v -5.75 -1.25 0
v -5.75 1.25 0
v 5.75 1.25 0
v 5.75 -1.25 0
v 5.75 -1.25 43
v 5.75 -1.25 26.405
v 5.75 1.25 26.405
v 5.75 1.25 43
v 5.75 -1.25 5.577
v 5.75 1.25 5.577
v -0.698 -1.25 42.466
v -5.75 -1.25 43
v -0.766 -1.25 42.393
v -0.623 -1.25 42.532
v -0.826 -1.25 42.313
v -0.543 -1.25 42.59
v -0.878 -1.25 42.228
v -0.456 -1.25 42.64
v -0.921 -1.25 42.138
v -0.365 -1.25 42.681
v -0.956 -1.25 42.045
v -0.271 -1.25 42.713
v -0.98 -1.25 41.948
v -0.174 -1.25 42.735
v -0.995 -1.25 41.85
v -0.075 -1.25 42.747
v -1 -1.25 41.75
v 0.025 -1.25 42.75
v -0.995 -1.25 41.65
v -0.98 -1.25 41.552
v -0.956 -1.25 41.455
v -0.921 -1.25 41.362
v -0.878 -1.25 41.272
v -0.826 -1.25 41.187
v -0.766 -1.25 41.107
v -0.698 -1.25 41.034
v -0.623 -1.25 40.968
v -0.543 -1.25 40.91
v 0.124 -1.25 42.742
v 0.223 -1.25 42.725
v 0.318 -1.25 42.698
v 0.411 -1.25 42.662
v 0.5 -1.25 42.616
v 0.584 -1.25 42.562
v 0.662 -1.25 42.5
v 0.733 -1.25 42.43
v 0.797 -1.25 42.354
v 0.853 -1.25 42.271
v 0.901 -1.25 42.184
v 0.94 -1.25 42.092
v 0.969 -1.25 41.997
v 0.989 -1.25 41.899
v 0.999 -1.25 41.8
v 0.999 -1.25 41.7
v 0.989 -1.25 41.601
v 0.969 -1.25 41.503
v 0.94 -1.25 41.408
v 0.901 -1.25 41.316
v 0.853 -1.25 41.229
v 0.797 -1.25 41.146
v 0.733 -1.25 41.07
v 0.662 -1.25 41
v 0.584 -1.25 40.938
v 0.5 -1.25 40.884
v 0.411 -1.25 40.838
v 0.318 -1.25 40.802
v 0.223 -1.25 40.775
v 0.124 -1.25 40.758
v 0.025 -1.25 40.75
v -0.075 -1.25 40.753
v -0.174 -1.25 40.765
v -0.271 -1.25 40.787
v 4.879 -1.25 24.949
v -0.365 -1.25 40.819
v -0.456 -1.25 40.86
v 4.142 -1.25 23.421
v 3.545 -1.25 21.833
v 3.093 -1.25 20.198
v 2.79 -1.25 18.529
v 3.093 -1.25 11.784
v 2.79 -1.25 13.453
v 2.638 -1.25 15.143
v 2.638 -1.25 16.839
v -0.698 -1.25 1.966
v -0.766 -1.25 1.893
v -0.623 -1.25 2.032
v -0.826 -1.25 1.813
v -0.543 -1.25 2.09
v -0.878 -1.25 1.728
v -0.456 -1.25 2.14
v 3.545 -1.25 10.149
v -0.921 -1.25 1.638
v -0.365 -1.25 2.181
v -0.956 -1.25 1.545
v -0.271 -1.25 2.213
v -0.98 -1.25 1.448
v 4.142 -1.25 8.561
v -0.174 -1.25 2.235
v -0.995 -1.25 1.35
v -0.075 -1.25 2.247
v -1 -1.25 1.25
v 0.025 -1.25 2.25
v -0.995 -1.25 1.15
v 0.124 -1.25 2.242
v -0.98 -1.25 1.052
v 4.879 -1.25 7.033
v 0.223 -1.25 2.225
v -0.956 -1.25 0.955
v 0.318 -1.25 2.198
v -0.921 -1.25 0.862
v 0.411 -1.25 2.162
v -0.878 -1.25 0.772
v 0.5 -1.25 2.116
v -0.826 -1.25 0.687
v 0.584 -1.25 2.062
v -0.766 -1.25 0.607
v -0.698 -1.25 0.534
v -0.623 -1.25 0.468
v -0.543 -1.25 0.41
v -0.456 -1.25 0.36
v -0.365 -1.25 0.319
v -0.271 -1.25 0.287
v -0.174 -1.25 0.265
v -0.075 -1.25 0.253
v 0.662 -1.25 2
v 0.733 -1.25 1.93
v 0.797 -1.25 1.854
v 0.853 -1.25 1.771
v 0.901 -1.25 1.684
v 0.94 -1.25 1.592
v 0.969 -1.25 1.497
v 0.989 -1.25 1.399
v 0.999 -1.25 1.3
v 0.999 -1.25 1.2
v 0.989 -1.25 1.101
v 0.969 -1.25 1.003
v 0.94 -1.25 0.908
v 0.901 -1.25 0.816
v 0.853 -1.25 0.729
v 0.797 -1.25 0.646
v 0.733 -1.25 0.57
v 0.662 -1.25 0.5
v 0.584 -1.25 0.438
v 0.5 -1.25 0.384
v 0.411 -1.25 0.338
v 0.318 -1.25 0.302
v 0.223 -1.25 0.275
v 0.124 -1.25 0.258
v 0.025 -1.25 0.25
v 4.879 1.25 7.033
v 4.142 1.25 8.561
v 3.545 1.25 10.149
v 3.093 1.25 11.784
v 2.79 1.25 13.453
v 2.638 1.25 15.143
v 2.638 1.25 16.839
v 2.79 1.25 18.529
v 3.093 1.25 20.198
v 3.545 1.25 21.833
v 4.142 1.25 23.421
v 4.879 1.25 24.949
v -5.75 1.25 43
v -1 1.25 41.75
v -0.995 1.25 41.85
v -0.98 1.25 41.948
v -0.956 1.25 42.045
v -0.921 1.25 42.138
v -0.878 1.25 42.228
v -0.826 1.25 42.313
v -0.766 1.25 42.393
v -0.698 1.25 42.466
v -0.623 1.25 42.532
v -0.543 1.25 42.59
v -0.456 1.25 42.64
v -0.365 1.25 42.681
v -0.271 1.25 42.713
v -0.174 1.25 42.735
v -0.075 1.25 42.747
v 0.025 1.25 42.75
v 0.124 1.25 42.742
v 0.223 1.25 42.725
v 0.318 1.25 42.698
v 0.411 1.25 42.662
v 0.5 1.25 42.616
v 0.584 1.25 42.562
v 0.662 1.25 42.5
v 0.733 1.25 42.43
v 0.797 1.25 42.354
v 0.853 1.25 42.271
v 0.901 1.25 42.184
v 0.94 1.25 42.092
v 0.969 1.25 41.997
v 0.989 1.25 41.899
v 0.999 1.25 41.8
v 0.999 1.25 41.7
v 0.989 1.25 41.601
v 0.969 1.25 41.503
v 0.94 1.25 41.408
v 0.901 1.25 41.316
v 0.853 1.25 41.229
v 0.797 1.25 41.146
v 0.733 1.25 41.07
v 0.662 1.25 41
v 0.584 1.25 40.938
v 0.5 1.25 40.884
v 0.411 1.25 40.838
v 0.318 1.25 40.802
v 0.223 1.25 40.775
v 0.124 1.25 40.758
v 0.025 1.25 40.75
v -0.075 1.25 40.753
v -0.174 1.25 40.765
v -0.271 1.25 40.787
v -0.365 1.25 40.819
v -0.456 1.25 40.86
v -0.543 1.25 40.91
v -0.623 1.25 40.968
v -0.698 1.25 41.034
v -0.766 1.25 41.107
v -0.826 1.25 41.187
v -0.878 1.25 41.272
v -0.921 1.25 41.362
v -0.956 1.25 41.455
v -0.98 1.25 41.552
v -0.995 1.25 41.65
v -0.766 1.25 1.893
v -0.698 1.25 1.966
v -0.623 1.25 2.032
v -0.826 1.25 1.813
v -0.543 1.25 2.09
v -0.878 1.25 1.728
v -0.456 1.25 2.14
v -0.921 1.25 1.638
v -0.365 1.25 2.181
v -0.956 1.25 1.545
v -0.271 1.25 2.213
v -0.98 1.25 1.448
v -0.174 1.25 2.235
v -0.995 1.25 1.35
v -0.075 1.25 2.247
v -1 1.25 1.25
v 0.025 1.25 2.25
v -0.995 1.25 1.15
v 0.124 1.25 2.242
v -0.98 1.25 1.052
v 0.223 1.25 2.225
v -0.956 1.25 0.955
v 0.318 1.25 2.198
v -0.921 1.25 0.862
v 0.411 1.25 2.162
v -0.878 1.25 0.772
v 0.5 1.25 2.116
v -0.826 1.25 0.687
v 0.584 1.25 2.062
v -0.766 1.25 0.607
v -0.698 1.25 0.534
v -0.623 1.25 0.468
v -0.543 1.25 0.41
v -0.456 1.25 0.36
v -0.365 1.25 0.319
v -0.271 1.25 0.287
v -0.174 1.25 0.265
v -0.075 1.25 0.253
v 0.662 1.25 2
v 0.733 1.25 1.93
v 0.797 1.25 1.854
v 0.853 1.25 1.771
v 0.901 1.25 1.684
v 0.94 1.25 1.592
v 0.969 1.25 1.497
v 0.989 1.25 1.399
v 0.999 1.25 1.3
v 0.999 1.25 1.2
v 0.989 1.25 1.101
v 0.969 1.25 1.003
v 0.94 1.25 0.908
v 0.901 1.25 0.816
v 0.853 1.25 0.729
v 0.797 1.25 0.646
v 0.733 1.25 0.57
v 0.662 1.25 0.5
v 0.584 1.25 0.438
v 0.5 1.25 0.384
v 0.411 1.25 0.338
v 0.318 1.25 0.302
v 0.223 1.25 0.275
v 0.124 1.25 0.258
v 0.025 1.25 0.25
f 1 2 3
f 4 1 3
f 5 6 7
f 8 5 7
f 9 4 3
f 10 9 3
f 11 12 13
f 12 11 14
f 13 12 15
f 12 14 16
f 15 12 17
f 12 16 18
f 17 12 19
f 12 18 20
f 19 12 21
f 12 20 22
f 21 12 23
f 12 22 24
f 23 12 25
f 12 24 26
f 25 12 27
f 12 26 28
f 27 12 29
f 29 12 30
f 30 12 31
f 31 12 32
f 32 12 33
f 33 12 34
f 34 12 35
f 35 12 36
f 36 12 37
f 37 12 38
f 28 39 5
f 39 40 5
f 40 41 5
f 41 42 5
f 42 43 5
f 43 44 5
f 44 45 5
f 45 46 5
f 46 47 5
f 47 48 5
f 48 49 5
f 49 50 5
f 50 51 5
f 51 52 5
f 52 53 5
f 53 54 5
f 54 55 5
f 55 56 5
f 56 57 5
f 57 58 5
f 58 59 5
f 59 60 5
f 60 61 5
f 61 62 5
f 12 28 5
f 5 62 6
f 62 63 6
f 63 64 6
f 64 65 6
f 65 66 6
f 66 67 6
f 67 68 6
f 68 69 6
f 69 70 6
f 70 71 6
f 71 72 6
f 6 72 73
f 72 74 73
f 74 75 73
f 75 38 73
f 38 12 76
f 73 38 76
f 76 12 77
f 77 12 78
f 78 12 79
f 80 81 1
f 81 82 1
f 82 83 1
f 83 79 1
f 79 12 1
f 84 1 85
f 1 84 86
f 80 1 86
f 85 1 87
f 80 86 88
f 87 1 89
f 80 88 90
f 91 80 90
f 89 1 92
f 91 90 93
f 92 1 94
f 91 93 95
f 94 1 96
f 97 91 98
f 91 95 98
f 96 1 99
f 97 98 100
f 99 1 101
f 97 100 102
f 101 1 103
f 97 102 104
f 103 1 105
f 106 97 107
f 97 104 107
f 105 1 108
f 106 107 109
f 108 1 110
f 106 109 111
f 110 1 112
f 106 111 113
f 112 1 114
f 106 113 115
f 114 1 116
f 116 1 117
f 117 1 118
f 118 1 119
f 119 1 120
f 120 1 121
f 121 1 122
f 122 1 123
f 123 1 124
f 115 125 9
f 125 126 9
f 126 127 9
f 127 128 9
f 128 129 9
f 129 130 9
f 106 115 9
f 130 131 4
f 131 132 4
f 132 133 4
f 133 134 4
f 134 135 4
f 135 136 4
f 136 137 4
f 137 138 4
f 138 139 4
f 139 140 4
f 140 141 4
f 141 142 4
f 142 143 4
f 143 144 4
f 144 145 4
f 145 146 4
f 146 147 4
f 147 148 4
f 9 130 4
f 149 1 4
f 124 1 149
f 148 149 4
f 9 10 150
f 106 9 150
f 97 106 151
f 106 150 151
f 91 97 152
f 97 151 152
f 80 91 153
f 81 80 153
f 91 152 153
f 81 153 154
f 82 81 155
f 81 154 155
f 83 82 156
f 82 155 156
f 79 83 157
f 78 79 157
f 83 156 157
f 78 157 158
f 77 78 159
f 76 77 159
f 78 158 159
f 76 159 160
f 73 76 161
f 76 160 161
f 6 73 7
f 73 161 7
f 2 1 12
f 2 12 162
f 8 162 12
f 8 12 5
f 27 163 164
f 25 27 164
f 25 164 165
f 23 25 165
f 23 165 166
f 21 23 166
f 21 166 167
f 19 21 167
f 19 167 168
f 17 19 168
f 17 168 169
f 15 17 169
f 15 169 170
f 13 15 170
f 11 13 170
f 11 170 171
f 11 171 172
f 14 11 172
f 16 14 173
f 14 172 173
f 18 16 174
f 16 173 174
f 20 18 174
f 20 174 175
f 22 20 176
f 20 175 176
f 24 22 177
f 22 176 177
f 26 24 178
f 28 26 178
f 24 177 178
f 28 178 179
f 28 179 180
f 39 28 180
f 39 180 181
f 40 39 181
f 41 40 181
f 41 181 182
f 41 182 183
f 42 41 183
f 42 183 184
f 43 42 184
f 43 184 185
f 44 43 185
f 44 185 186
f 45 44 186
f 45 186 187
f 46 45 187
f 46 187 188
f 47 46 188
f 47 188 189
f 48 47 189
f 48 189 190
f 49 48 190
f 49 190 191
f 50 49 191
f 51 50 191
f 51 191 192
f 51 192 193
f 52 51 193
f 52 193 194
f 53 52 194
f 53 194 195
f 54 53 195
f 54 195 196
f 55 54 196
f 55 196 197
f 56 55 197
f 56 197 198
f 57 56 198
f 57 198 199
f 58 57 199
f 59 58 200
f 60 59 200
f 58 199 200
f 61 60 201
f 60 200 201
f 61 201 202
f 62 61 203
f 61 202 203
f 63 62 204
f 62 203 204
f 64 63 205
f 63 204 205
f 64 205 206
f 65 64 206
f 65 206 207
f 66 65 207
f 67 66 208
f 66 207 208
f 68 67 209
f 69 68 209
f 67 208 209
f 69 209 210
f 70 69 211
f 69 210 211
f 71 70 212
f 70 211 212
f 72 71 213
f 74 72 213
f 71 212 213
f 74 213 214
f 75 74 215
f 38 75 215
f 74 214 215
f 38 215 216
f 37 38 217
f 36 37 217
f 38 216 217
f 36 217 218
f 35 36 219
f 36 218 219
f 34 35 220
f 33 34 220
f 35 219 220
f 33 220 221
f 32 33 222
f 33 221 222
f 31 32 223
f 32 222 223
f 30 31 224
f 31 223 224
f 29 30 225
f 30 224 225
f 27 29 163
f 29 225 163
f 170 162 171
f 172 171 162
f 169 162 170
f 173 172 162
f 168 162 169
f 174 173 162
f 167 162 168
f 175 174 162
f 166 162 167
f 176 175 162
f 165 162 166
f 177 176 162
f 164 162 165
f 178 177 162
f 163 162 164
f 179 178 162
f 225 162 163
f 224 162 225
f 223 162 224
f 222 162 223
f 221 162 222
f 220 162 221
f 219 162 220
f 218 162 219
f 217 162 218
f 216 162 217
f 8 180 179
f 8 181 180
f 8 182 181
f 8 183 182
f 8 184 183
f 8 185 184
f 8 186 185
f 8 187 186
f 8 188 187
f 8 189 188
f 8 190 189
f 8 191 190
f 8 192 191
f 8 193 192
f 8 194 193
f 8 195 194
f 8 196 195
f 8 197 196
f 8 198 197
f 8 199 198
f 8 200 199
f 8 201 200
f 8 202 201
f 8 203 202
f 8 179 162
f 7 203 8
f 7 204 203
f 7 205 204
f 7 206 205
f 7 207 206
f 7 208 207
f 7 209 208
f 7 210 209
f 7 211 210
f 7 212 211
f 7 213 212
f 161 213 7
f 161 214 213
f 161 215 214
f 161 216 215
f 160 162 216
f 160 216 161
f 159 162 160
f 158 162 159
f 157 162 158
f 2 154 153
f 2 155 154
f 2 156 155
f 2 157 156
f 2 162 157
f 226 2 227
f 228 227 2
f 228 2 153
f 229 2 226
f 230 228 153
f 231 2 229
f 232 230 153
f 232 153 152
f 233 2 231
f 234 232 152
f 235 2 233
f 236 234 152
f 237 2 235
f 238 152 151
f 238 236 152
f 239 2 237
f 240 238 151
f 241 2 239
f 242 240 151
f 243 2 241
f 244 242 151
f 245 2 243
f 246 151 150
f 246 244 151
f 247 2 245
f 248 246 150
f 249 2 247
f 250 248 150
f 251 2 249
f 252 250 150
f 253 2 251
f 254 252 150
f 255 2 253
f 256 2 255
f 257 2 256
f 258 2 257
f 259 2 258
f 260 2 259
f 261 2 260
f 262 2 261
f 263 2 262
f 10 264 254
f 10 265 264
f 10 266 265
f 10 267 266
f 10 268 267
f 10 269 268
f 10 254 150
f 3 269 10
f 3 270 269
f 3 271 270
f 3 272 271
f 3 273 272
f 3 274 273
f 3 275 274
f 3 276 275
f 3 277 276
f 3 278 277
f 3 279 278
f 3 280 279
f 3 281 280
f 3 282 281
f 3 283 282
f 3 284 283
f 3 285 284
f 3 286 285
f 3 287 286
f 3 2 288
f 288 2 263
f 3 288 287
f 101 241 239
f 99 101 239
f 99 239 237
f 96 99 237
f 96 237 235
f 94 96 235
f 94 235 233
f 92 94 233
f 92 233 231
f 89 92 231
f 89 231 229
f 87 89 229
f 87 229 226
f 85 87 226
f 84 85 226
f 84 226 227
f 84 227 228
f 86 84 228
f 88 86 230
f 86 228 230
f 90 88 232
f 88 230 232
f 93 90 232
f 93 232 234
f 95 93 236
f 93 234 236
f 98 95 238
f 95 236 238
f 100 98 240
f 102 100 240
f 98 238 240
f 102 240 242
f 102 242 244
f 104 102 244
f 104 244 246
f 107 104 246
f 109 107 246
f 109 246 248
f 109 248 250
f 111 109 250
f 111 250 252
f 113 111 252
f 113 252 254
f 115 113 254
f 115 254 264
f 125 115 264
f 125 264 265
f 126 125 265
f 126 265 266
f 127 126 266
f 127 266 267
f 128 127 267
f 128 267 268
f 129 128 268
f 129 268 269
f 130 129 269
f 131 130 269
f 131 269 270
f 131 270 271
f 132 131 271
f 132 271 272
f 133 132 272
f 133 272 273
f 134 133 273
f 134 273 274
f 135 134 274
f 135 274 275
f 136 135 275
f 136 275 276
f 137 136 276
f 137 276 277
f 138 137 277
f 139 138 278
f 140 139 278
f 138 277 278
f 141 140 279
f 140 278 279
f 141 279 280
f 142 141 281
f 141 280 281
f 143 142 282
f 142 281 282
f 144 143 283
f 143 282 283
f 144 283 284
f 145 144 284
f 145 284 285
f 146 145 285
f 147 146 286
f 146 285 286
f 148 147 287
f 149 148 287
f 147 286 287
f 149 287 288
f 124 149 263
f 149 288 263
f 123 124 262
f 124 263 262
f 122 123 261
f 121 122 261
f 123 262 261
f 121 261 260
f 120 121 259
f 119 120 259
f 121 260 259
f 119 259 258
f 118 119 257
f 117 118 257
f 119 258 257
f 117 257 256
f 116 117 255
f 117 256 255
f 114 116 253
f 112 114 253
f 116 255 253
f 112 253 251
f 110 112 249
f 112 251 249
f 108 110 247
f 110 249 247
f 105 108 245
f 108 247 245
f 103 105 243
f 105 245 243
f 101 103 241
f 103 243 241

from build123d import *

# Parameters (mm, degrees)
F0_W     = 11.5
F0_H     = 2.5
F1_DEPTH = 43
F2_R     = 1
F3_DEPTH = 25
F5_DEPTH = 25


with BuildPart() as f1:
    # F0 (on Top) → F1 (new body)
    with BuildSketch(Plane.XY):
        Rectangle(F0_W, F0_H)
    extrude(amount=F1_DEPTH)

    # F2 (on face) → F3 (cut)
    with BuildSketch(Plane(origin=(0, 1.25, 0), x_dir=(-1, 0, 0), z_dir=(0, 1, 0))):
        with Locations((0, 1.25)):
            Circle(F2_R)
        with Locations((0, 41.75)):
            Circle(F2_R)
    extrude(amount=-F3_DEPTH, mode=Mode.SUBTRACT)

    # F4 (on face) → F5 (cut)
    with BuildSketch(Plane(origin=(0, 1.25, 0), x_dir=(-1, 0, 0), z_dir=(0, 1, 0))):
        with BuildLine():
            Line((-5.75, 26.404966), (-5.75, 5.576983))
            ThreePointArc((-5.75, 5.576983), (-2.61855, 15.990974), (-5.75, 26.404966))
        make_face()
    extrude(amount=-F5_DEPTH, mode=Mode.SUBTRACT)


solid = f1.part
